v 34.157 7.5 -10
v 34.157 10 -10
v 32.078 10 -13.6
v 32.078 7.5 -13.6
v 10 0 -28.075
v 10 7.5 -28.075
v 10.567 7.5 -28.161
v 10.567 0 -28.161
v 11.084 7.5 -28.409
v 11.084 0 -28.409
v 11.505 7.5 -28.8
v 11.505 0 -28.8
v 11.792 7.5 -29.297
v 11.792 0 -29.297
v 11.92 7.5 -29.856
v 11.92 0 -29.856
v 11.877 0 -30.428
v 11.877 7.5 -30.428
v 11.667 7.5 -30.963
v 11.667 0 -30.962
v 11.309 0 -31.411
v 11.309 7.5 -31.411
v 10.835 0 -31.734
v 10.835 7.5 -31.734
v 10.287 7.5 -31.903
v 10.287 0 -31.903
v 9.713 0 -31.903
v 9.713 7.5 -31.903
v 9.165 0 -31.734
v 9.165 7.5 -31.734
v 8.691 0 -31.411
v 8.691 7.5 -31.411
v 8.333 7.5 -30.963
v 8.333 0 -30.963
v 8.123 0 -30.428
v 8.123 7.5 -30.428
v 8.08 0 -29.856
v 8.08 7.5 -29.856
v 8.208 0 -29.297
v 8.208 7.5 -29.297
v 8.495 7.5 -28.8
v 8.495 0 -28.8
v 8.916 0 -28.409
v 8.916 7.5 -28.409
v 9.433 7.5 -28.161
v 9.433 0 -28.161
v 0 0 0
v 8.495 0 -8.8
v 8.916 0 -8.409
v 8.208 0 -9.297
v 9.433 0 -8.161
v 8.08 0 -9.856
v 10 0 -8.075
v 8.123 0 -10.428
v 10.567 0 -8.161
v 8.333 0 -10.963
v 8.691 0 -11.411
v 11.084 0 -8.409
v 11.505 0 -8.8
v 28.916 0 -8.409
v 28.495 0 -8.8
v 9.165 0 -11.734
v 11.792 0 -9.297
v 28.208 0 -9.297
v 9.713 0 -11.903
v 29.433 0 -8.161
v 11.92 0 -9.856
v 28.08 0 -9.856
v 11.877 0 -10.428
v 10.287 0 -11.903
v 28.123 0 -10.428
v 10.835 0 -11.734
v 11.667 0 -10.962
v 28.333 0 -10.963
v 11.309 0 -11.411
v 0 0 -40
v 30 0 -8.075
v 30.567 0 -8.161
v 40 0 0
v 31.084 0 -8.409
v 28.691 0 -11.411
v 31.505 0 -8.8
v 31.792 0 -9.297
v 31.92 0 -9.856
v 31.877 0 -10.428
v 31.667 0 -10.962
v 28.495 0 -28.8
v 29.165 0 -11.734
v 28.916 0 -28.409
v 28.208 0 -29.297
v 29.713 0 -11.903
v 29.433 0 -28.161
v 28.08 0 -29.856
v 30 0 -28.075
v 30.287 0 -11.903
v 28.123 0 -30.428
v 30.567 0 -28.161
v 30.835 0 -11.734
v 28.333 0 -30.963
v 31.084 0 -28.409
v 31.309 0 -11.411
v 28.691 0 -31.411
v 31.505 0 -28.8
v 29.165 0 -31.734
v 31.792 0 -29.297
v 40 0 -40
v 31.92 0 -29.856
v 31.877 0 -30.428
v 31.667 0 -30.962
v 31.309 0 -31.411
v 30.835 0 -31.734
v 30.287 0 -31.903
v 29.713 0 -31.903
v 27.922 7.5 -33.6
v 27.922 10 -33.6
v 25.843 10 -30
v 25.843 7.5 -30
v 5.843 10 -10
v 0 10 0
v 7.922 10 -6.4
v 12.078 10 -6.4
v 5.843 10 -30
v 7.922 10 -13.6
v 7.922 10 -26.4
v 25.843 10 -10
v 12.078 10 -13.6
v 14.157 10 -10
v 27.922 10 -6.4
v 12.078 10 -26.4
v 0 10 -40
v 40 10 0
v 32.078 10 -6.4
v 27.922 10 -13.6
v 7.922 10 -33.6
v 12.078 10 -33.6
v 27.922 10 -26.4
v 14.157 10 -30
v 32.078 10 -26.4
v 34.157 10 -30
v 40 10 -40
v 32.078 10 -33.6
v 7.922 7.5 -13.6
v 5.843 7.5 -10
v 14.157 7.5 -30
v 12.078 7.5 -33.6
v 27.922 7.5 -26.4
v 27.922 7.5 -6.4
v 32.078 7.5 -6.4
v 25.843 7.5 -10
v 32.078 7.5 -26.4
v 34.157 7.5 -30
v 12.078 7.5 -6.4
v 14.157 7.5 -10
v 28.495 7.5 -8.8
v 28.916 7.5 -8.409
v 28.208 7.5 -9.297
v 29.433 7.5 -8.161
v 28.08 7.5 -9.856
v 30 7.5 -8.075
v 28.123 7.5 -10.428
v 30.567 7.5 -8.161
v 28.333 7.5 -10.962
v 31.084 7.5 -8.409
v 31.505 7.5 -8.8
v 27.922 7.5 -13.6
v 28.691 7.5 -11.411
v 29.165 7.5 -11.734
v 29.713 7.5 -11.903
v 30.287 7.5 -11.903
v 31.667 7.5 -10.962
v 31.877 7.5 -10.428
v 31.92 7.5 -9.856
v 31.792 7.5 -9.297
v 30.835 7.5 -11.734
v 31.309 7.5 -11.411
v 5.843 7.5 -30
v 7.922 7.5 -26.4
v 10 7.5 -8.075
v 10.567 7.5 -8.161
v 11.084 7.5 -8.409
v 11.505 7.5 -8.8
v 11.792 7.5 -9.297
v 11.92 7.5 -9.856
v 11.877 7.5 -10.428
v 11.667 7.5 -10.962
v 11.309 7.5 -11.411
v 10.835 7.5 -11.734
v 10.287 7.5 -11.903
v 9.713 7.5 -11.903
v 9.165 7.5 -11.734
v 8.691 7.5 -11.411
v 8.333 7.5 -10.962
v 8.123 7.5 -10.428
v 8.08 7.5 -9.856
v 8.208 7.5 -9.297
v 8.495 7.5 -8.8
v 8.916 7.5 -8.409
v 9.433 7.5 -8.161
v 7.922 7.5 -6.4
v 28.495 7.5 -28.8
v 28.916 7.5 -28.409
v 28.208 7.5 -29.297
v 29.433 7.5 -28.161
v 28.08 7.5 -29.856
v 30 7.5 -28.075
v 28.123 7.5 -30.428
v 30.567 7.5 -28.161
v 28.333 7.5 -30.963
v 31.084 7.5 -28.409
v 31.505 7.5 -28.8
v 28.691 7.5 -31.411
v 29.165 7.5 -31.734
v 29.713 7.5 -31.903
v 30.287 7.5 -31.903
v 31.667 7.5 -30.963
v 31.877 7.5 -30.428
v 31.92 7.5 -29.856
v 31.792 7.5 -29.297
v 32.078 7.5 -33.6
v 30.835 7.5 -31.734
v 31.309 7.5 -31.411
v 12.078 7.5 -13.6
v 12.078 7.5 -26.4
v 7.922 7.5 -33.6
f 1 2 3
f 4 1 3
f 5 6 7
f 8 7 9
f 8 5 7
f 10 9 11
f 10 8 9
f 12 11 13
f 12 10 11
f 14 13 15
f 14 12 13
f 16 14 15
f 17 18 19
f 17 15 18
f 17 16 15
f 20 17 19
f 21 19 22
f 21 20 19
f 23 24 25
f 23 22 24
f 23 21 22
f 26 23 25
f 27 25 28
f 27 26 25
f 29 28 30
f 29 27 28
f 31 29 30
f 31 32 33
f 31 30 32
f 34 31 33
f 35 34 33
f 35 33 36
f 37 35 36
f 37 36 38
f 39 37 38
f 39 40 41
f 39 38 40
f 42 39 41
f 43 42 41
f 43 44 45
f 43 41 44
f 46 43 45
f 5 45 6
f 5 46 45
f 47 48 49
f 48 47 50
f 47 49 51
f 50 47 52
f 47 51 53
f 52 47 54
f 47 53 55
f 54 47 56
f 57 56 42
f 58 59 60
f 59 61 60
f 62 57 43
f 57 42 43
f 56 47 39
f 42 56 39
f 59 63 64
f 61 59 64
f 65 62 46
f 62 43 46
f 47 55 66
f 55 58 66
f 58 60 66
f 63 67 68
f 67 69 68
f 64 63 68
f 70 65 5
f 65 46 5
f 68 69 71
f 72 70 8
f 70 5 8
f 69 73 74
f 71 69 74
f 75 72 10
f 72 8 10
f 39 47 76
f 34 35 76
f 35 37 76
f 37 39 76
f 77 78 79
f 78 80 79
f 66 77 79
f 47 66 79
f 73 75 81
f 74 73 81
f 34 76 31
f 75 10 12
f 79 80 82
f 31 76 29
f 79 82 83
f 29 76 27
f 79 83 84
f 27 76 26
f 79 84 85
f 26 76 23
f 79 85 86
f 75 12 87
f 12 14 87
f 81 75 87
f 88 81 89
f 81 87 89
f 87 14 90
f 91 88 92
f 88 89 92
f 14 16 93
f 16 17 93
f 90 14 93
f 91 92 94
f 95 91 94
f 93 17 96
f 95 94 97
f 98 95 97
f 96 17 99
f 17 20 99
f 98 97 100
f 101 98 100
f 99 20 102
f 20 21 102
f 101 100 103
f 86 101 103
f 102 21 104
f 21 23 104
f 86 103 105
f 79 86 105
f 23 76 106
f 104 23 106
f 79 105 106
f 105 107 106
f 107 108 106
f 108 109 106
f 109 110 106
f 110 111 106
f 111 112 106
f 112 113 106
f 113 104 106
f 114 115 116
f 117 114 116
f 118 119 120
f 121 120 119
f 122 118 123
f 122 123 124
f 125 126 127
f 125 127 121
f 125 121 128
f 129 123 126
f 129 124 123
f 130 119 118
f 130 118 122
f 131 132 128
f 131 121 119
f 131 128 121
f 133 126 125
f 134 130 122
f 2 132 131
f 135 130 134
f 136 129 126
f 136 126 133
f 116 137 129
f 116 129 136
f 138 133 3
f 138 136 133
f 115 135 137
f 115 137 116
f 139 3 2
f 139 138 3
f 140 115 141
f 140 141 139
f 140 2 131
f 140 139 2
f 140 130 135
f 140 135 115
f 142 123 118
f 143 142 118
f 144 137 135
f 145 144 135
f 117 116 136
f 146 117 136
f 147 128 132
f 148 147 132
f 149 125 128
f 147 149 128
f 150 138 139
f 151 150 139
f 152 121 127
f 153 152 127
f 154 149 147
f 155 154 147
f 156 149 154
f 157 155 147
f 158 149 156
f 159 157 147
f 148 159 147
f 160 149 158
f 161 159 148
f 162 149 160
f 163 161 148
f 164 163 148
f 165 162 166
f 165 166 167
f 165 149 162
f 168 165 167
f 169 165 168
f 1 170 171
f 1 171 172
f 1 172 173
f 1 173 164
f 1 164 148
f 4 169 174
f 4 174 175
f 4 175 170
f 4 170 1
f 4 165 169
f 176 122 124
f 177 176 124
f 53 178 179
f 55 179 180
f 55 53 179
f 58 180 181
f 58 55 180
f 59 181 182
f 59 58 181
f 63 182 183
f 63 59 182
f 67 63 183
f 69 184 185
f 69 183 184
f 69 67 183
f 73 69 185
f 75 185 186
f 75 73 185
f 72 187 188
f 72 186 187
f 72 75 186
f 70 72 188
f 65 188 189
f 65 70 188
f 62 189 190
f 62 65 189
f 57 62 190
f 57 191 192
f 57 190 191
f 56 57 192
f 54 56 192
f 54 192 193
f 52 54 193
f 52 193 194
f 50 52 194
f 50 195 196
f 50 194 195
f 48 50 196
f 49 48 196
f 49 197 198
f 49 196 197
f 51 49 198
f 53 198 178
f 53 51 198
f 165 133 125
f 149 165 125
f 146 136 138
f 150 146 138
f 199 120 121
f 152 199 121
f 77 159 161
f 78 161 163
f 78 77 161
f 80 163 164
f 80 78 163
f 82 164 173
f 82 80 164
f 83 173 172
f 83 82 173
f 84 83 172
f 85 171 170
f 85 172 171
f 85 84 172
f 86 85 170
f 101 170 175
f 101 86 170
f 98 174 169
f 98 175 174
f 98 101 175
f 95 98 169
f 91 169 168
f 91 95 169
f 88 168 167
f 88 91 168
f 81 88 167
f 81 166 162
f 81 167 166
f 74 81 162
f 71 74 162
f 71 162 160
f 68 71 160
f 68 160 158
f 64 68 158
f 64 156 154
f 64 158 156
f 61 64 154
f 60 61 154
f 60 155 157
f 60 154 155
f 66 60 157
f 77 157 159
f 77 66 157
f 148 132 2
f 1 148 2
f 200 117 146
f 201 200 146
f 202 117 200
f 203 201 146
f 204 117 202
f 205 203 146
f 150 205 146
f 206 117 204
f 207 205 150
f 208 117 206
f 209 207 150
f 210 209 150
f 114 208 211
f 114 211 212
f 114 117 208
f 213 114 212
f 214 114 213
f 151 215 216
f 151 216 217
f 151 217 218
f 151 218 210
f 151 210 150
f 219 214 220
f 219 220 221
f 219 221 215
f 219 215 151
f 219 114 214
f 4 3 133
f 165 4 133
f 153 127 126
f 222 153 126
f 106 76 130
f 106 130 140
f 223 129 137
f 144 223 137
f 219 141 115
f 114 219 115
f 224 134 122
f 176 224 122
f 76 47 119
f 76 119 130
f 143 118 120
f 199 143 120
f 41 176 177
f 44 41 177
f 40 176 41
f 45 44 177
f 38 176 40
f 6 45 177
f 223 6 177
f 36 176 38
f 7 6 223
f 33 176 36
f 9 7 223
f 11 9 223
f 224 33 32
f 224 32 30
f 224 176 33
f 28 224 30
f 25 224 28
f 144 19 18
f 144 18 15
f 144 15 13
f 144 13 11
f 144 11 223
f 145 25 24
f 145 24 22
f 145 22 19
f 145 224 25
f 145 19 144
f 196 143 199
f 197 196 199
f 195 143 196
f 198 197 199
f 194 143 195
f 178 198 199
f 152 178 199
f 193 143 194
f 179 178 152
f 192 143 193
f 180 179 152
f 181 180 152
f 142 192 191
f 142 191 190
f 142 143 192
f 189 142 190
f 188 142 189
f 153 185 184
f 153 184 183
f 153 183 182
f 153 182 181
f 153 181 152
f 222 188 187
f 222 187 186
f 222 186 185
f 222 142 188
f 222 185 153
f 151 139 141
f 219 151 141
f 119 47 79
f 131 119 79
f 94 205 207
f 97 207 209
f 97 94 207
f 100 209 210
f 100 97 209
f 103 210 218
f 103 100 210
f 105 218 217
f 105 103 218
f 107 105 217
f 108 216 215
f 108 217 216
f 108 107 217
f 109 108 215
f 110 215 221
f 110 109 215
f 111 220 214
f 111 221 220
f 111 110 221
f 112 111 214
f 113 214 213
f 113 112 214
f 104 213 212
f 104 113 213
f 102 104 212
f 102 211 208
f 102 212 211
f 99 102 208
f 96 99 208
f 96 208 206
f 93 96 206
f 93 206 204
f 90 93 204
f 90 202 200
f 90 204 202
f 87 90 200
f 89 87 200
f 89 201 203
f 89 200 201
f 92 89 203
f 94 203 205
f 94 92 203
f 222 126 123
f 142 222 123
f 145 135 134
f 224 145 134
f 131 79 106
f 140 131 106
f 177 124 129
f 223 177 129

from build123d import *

# Parameters (mm, degrees)
SKETCH1_W           = 40
SKETCH1_H           = 40
SKETCH1_R           = 1.925
BOSS_EXTRUDE1_DEPTH = 10
CUT_EXTRUDE1_DEPTH  = 2.5


with BuildPart() as part:
    # Sketch1 → Boss-Extrude1 (new body)
    with BuildSketch(Plane(origin=(0, 0, 0), x_dir=(1, 0, 0), z_dir=(0, 1, 0))):
        with Locations((20, 20)):
            Rectangle(SKETCH1_W, SKETCH1_H)
        with Locations(Location((10, 30, 0), (0, 0, 270))):
            Circle(SKETCH1_R, mode=Mode.SUBTRACT)
        with Locations(Location((30, 30, 0), (0, 0, 270))):
            Circle(SKETCH1_R, mode=Mode.SUBTRACT)
        with Locations(Location((30, 10, 0), (0, 0, 270))):
            Circle(SKETCH1_R, mode=Mode.SUBTRACT)
        with Locations(Location((10, 10, 0), (0, 0, 270))):
            Circle(SKETCH1_R, mode=Mode.SUBTRACT)
    extrude(amount=BOSS_EXTRUDE1_DEPTH)

    # Sketch2 → Cut-Extrude1 (cut)
    with BuildSketch(Plane(origin=(0, 10, 0), x_dir=(1, 0, 0), z_dir=(0, 1, 0))):
        Polygon((14.156921938, 10), (12.078460969, 13.6), (7.921539031, 13.6), (5.843078062, 10), (7.921539031, 6.4), (12.078460969, 6.4), align=None)
        Polygon((25.843078062, 10), (27.921539031, 6.4), (32.078460969, 6.4), (34.156921938, 10), (32.078460969, 13.6), (27.921539031, 13.6), align=None)
        Polygon((25.843078062, 30), (27.921539031, 26.4), (32.078460969, 26.4), (34.156921938, 30), (32.078460969, 33.6), (27.921539031, 33.6), align=None)
        Polygon((14.156921938, 30), (12.078460969, 33.6), (7.921539031, 33.6), (5.843078062, 30), (7.921539031, 26.4), (12.078460969, 26.4), align=None)
    extrude(amount=-CUT_EXTRUDE1_DEPTH, mode=Mode.SUBTRACT)


solid = part.part
